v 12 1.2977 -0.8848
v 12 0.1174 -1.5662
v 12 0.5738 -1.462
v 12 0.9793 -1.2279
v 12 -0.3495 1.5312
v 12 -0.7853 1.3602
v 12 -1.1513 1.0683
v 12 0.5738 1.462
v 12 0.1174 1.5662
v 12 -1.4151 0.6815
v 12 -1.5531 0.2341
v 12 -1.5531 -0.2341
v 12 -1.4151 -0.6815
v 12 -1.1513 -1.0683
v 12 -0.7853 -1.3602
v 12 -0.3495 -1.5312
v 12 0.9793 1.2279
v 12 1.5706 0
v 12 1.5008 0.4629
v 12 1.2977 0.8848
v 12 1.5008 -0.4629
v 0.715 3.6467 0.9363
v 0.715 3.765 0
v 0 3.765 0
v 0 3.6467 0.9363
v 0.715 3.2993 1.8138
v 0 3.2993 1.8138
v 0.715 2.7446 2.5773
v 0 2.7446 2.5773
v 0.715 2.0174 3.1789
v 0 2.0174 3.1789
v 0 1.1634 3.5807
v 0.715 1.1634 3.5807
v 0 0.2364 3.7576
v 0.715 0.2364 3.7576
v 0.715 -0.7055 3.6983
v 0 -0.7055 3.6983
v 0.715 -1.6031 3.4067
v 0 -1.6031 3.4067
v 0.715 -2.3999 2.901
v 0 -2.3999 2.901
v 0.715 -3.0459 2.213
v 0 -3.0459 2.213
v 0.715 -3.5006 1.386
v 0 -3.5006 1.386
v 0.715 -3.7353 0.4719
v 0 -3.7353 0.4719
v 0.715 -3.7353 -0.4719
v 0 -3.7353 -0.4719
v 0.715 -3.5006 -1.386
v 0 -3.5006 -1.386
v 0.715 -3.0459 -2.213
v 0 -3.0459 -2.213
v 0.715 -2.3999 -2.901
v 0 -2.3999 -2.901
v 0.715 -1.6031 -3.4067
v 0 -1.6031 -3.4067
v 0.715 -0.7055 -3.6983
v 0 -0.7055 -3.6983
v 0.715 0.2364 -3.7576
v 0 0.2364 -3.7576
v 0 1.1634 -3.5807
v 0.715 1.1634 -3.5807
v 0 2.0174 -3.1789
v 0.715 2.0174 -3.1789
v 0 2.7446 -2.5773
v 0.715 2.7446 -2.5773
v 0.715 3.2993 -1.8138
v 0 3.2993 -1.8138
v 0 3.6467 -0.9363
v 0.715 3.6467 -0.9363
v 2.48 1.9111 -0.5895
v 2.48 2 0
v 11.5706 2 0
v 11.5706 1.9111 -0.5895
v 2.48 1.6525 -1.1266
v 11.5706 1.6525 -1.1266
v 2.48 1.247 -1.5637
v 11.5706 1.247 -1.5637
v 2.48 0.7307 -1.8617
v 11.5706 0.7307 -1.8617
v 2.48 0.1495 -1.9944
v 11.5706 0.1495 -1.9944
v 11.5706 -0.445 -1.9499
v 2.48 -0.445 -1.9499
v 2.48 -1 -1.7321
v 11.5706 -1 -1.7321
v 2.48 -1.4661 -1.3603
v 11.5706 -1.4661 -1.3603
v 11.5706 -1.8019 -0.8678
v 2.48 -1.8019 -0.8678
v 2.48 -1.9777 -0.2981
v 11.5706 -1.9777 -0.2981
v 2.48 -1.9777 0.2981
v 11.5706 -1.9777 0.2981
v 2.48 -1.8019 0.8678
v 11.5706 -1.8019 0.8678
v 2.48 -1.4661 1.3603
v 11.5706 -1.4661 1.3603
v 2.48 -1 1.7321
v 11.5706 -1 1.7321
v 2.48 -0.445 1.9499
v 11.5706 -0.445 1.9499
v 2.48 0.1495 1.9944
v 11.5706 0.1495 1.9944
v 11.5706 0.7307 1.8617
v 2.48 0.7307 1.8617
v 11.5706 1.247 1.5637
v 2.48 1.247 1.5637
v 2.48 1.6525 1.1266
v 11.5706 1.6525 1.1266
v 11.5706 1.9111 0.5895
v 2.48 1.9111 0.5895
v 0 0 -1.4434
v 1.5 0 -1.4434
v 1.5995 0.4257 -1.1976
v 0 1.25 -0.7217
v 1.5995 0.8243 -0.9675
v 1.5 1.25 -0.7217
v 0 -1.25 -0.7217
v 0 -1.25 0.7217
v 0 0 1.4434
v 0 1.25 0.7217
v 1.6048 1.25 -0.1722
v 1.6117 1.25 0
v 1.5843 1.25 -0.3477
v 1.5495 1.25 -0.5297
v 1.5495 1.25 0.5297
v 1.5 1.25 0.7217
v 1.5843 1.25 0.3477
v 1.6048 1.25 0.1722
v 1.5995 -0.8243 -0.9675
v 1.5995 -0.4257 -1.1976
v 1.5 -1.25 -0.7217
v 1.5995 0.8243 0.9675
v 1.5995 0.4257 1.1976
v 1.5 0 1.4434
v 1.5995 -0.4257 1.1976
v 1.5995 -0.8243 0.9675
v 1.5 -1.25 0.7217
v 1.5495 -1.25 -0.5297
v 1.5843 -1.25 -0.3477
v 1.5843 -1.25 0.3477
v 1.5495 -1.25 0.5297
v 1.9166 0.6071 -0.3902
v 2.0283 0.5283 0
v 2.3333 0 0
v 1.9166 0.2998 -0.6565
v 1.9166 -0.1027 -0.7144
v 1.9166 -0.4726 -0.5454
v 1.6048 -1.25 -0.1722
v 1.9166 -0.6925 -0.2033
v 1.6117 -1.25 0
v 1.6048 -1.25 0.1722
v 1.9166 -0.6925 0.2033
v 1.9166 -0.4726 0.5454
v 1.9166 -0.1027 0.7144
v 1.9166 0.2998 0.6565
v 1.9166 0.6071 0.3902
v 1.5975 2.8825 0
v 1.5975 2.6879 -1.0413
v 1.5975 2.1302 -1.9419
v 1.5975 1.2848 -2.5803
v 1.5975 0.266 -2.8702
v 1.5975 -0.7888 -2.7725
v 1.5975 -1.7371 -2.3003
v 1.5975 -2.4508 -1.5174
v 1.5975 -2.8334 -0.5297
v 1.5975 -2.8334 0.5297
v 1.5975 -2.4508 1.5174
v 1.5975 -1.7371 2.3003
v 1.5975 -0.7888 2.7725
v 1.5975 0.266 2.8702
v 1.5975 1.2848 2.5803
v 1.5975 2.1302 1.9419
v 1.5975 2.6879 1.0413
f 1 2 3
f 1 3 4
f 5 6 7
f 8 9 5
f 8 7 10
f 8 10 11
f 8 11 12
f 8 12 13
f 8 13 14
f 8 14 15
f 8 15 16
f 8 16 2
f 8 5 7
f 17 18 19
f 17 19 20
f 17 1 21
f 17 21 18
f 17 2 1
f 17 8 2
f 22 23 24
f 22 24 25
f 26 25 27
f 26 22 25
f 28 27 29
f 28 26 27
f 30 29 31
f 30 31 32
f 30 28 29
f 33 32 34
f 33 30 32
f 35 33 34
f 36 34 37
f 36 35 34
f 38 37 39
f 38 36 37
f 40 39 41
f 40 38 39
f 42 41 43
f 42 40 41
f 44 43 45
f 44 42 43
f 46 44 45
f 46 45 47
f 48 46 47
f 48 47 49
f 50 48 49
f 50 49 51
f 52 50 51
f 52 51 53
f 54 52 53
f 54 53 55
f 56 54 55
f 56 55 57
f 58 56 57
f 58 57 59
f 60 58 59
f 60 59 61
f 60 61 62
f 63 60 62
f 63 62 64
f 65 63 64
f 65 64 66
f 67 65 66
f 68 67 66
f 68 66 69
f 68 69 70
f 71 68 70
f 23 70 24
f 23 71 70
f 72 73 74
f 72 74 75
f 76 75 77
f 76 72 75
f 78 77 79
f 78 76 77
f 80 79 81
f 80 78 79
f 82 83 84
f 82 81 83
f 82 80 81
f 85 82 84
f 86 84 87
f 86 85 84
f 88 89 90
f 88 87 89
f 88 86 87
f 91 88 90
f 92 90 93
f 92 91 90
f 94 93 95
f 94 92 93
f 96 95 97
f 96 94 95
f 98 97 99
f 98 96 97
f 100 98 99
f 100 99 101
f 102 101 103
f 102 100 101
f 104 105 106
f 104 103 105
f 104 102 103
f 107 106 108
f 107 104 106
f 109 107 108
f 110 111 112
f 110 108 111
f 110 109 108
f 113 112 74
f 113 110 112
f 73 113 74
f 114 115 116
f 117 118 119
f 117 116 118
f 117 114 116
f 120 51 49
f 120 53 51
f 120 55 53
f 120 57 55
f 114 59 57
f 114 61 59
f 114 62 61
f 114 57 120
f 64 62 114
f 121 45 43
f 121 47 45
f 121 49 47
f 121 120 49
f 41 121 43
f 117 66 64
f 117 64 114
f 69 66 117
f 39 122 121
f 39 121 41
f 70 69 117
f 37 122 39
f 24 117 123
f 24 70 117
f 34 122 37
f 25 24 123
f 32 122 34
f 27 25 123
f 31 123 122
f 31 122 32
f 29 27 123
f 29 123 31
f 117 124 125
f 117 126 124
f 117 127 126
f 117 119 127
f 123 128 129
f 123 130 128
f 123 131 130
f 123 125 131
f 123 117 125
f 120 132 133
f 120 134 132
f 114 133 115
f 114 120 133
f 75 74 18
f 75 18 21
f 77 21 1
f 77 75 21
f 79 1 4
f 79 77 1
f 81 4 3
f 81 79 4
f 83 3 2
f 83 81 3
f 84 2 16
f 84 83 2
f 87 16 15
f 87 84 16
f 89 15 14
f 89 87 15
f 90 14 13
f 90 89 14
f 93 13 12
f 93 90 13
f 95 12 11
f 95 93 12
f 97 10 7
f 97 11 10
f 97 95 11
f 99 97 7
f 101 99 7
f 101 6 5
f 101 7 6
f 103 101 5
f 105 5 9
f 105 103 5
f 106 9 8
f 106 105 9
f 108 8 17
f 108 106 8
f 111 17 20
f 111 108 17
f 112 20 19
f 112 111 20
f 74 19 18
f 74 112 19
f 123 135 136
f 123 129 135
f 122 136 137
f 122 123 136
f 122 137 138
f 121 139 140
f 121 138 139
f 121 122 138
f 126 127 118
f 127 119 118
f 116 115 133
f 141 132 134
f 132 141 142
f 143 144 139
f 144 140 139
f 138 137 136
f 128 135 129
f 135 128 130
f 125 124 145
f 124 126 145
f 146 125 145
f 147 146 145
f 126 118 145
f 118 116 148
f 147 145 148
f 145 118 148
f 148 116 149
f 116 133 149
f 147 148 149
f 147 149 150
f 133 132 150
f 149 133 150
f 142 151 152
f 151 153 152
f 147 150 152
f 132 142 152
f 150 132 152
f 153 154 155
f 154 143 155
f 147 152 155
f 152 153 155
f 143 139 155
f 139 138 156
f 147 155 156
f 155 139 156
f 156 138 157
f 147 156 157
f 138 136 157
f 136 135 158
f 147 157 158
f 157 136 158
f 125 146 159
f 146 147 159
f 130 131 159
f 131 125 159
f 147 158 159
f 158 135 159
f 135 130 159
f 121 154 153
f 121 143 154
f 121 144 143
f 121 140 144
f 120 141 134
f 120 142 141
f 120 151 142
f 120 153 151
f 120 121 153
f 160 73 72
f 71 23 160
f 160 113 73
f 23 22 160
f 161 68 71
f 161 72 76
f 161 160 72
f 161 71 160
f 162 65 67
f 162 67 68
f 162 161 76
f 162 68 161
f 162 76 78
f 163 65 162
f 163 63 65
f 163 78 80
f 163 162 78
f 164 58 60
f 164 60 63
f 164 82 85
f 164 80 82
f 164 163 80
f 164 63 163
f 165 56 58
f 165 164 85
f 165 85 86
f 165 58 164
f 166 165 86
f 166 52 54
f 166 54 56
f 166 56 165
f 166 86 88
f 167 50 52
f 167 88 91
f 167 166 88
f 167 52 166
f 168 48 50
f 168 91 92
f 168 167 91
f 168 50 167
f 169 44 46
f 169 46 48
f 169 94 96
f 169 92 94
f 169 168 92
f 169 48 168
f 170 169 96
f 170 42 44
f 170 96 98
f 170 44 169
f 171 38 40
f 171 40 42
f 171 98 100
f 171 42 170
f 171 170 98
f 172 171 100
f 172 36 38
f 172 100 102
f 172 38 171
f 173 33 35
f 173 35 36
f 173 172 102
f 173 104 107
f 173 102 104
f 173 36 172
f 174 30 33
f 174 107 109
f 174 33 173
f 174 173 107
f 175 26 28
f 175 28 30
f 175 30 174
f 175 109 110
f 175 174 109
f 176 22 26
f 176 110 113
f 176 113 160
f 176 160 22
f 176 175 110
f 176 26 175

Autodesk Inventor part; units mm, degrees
ref_plane "YZ Plane" through (0, 0, 0) normal (1, 0, 0) x (0, 1, 0)
ref_plane "XZ Plane" through (0, 0, 0) normal (0, 1, 0) x (-1, 0, 0)
sketch "Skizze1" plane through (0, 0, 0) normal (0, 0, 1) x (1, 0, 0)
  line L0 (12, 0) -> (12, 2)
  line L1 (12, 2) -> (4.58, 2)
  line L2 (4.58, 2) -> (4.1506, 2)
  line L3 (0, 3.765) -> (0, 1.4434)
  line L4 (0, 1.4434) -> (1.5, 1.4434)
  line L5 (1.5, 1.4434) -> (2.3333, 0)
  line L6 (2.3333, 0) -> (12, 0)
  line L7 (0, 3.765) -> (0.715, 3.765)
  line L8 (0.715, 3.765) -> (2.48, 2)
  line L9 (4.1506, 2) -> (2.48, 2)
  line L10 (4.58, 2) -> (2.48, 2) construction
  line L11 (2.48, 2) -> (2.48, 2)
  line L12 (-2.4, 0) -> (14.4, 0) projected
  line L13 (0, -0.753) -> (0, 4.518) projected
  dimension "d0" = 12
  dimension "d1" = 7.42
  dimension "d2" = 1.5
  dimension "d3" = 4
  dimension "d6" = 2.48
  dimension "d7" = 45
  dimension "d8" = 2.8868
  dimension "d9" = 60
  dimension "d10" = 7.53
  dimension "d11" = 4
  dimension "d12" = 0.4294
revolve "Körper" add sketch "Skizze1" angle 360 about axis through (2.3333, 0, 0) along (1, 0, 0) contours L6 L5 L4 L3 L7 L8 L9 L2 L1 L0
sketch "Skizze2" plane through (0, 0, 0) normal (-1, 0, 0) x (0, 0, 1)
  circle A0 centre (0, 0) radius 1.4434 projected
  line L0 (0, -5.271) -> (0, 5.271) projected
  line L1 (-5.271, 0) -> (5.271, 0) projected
  line L2 (1.4434, 0) -> (0.7217, -1.25)
  line L3 (0.7217, -1.25) -> (-0.7217, -1.25)
  line L4 (-0.7217, -1.25) -> (-1.4434, 0)
  line L5 (-1.4434, 0) -> (-0.7217, 1.25)
  line L6 (-0.7217, 1.25) -> (0.7217, 1.25)
  line L7 (0.7217, 1.25) -> (1.4434, 0)
  point P0 (0, 1.4434)
extrude "Loch" add sketch "Skizze2" against normal up to next contours L7 A0 | A0 L2 | L6 L0 A0 | A0 L0 L3 | L0 L6 A0 | A0 L3 L0 | L4 A0 | A0 L5
thread "Gewinde" size "M4x0.7" class "6g" standard "ISO Metric profile" length 7.42
chamfer "Fase1" distance 0.4294 distance2 0.4294 1 edges at (12, -2, 0) measured on face at (12, 0.3787, 0.698)
ref_plane "Work Plane1" through (104.775, 0, 0) normal (0, 0, -1) x (1, 0, 0)
equation "\"d15\" = GEL"
equation "\"d17\" = -0.5 * SPD + 0.5 * GD"
equation "\"d18\" = GUL"
equation "\"d0\" = NLG"
equation "\"d1\" = GEL"
equation "\"d2\" = INTI"
equation "\"d3\" = GD"
equation "\"d6\" = KOH"
equation "\"d7\" = 0.5 * SEWI"
equation "\"d8\" = 1.1547 * SW"
equation "\"d10\" = KOD"
equation "\"d11\" = BDM"
equation "\"d12\" = GAL"
equation "\"NLG\" = 12"
equation "\"INTI\" = 1.5"
equation "\"GEL\" = 7.42"
equation "\"GAL\" = 0.61345 * PTC"
equation "\"KOH\" = 2.48"
equation "\"KOD\" = 7.53"
equation "\"GUL\" = 0.61345 * PTC"
equation "\"SPD\" = NND - 1.2269 * PTC"
equation "\"BDM\" = NND"
equation "\"GD\" = NND"
equation "\"SEWI\" = 90deg"
equation "\"SW\" = 2.5"
equation "\"TOA\" = 30deg"
equation "\"GD1\" = THREADDIA - 1.2269 * PTC"
equation "\"EPV\" = 4.58"
equation "\"THREADDIA\" = 4"
equation "\"PTC\" = 0.7"
equation "\"NND\" = 4"
equation "\"E0\" = 2.89"
properties part number "ISO 10642  - M4  x  12" material "Stahl"
